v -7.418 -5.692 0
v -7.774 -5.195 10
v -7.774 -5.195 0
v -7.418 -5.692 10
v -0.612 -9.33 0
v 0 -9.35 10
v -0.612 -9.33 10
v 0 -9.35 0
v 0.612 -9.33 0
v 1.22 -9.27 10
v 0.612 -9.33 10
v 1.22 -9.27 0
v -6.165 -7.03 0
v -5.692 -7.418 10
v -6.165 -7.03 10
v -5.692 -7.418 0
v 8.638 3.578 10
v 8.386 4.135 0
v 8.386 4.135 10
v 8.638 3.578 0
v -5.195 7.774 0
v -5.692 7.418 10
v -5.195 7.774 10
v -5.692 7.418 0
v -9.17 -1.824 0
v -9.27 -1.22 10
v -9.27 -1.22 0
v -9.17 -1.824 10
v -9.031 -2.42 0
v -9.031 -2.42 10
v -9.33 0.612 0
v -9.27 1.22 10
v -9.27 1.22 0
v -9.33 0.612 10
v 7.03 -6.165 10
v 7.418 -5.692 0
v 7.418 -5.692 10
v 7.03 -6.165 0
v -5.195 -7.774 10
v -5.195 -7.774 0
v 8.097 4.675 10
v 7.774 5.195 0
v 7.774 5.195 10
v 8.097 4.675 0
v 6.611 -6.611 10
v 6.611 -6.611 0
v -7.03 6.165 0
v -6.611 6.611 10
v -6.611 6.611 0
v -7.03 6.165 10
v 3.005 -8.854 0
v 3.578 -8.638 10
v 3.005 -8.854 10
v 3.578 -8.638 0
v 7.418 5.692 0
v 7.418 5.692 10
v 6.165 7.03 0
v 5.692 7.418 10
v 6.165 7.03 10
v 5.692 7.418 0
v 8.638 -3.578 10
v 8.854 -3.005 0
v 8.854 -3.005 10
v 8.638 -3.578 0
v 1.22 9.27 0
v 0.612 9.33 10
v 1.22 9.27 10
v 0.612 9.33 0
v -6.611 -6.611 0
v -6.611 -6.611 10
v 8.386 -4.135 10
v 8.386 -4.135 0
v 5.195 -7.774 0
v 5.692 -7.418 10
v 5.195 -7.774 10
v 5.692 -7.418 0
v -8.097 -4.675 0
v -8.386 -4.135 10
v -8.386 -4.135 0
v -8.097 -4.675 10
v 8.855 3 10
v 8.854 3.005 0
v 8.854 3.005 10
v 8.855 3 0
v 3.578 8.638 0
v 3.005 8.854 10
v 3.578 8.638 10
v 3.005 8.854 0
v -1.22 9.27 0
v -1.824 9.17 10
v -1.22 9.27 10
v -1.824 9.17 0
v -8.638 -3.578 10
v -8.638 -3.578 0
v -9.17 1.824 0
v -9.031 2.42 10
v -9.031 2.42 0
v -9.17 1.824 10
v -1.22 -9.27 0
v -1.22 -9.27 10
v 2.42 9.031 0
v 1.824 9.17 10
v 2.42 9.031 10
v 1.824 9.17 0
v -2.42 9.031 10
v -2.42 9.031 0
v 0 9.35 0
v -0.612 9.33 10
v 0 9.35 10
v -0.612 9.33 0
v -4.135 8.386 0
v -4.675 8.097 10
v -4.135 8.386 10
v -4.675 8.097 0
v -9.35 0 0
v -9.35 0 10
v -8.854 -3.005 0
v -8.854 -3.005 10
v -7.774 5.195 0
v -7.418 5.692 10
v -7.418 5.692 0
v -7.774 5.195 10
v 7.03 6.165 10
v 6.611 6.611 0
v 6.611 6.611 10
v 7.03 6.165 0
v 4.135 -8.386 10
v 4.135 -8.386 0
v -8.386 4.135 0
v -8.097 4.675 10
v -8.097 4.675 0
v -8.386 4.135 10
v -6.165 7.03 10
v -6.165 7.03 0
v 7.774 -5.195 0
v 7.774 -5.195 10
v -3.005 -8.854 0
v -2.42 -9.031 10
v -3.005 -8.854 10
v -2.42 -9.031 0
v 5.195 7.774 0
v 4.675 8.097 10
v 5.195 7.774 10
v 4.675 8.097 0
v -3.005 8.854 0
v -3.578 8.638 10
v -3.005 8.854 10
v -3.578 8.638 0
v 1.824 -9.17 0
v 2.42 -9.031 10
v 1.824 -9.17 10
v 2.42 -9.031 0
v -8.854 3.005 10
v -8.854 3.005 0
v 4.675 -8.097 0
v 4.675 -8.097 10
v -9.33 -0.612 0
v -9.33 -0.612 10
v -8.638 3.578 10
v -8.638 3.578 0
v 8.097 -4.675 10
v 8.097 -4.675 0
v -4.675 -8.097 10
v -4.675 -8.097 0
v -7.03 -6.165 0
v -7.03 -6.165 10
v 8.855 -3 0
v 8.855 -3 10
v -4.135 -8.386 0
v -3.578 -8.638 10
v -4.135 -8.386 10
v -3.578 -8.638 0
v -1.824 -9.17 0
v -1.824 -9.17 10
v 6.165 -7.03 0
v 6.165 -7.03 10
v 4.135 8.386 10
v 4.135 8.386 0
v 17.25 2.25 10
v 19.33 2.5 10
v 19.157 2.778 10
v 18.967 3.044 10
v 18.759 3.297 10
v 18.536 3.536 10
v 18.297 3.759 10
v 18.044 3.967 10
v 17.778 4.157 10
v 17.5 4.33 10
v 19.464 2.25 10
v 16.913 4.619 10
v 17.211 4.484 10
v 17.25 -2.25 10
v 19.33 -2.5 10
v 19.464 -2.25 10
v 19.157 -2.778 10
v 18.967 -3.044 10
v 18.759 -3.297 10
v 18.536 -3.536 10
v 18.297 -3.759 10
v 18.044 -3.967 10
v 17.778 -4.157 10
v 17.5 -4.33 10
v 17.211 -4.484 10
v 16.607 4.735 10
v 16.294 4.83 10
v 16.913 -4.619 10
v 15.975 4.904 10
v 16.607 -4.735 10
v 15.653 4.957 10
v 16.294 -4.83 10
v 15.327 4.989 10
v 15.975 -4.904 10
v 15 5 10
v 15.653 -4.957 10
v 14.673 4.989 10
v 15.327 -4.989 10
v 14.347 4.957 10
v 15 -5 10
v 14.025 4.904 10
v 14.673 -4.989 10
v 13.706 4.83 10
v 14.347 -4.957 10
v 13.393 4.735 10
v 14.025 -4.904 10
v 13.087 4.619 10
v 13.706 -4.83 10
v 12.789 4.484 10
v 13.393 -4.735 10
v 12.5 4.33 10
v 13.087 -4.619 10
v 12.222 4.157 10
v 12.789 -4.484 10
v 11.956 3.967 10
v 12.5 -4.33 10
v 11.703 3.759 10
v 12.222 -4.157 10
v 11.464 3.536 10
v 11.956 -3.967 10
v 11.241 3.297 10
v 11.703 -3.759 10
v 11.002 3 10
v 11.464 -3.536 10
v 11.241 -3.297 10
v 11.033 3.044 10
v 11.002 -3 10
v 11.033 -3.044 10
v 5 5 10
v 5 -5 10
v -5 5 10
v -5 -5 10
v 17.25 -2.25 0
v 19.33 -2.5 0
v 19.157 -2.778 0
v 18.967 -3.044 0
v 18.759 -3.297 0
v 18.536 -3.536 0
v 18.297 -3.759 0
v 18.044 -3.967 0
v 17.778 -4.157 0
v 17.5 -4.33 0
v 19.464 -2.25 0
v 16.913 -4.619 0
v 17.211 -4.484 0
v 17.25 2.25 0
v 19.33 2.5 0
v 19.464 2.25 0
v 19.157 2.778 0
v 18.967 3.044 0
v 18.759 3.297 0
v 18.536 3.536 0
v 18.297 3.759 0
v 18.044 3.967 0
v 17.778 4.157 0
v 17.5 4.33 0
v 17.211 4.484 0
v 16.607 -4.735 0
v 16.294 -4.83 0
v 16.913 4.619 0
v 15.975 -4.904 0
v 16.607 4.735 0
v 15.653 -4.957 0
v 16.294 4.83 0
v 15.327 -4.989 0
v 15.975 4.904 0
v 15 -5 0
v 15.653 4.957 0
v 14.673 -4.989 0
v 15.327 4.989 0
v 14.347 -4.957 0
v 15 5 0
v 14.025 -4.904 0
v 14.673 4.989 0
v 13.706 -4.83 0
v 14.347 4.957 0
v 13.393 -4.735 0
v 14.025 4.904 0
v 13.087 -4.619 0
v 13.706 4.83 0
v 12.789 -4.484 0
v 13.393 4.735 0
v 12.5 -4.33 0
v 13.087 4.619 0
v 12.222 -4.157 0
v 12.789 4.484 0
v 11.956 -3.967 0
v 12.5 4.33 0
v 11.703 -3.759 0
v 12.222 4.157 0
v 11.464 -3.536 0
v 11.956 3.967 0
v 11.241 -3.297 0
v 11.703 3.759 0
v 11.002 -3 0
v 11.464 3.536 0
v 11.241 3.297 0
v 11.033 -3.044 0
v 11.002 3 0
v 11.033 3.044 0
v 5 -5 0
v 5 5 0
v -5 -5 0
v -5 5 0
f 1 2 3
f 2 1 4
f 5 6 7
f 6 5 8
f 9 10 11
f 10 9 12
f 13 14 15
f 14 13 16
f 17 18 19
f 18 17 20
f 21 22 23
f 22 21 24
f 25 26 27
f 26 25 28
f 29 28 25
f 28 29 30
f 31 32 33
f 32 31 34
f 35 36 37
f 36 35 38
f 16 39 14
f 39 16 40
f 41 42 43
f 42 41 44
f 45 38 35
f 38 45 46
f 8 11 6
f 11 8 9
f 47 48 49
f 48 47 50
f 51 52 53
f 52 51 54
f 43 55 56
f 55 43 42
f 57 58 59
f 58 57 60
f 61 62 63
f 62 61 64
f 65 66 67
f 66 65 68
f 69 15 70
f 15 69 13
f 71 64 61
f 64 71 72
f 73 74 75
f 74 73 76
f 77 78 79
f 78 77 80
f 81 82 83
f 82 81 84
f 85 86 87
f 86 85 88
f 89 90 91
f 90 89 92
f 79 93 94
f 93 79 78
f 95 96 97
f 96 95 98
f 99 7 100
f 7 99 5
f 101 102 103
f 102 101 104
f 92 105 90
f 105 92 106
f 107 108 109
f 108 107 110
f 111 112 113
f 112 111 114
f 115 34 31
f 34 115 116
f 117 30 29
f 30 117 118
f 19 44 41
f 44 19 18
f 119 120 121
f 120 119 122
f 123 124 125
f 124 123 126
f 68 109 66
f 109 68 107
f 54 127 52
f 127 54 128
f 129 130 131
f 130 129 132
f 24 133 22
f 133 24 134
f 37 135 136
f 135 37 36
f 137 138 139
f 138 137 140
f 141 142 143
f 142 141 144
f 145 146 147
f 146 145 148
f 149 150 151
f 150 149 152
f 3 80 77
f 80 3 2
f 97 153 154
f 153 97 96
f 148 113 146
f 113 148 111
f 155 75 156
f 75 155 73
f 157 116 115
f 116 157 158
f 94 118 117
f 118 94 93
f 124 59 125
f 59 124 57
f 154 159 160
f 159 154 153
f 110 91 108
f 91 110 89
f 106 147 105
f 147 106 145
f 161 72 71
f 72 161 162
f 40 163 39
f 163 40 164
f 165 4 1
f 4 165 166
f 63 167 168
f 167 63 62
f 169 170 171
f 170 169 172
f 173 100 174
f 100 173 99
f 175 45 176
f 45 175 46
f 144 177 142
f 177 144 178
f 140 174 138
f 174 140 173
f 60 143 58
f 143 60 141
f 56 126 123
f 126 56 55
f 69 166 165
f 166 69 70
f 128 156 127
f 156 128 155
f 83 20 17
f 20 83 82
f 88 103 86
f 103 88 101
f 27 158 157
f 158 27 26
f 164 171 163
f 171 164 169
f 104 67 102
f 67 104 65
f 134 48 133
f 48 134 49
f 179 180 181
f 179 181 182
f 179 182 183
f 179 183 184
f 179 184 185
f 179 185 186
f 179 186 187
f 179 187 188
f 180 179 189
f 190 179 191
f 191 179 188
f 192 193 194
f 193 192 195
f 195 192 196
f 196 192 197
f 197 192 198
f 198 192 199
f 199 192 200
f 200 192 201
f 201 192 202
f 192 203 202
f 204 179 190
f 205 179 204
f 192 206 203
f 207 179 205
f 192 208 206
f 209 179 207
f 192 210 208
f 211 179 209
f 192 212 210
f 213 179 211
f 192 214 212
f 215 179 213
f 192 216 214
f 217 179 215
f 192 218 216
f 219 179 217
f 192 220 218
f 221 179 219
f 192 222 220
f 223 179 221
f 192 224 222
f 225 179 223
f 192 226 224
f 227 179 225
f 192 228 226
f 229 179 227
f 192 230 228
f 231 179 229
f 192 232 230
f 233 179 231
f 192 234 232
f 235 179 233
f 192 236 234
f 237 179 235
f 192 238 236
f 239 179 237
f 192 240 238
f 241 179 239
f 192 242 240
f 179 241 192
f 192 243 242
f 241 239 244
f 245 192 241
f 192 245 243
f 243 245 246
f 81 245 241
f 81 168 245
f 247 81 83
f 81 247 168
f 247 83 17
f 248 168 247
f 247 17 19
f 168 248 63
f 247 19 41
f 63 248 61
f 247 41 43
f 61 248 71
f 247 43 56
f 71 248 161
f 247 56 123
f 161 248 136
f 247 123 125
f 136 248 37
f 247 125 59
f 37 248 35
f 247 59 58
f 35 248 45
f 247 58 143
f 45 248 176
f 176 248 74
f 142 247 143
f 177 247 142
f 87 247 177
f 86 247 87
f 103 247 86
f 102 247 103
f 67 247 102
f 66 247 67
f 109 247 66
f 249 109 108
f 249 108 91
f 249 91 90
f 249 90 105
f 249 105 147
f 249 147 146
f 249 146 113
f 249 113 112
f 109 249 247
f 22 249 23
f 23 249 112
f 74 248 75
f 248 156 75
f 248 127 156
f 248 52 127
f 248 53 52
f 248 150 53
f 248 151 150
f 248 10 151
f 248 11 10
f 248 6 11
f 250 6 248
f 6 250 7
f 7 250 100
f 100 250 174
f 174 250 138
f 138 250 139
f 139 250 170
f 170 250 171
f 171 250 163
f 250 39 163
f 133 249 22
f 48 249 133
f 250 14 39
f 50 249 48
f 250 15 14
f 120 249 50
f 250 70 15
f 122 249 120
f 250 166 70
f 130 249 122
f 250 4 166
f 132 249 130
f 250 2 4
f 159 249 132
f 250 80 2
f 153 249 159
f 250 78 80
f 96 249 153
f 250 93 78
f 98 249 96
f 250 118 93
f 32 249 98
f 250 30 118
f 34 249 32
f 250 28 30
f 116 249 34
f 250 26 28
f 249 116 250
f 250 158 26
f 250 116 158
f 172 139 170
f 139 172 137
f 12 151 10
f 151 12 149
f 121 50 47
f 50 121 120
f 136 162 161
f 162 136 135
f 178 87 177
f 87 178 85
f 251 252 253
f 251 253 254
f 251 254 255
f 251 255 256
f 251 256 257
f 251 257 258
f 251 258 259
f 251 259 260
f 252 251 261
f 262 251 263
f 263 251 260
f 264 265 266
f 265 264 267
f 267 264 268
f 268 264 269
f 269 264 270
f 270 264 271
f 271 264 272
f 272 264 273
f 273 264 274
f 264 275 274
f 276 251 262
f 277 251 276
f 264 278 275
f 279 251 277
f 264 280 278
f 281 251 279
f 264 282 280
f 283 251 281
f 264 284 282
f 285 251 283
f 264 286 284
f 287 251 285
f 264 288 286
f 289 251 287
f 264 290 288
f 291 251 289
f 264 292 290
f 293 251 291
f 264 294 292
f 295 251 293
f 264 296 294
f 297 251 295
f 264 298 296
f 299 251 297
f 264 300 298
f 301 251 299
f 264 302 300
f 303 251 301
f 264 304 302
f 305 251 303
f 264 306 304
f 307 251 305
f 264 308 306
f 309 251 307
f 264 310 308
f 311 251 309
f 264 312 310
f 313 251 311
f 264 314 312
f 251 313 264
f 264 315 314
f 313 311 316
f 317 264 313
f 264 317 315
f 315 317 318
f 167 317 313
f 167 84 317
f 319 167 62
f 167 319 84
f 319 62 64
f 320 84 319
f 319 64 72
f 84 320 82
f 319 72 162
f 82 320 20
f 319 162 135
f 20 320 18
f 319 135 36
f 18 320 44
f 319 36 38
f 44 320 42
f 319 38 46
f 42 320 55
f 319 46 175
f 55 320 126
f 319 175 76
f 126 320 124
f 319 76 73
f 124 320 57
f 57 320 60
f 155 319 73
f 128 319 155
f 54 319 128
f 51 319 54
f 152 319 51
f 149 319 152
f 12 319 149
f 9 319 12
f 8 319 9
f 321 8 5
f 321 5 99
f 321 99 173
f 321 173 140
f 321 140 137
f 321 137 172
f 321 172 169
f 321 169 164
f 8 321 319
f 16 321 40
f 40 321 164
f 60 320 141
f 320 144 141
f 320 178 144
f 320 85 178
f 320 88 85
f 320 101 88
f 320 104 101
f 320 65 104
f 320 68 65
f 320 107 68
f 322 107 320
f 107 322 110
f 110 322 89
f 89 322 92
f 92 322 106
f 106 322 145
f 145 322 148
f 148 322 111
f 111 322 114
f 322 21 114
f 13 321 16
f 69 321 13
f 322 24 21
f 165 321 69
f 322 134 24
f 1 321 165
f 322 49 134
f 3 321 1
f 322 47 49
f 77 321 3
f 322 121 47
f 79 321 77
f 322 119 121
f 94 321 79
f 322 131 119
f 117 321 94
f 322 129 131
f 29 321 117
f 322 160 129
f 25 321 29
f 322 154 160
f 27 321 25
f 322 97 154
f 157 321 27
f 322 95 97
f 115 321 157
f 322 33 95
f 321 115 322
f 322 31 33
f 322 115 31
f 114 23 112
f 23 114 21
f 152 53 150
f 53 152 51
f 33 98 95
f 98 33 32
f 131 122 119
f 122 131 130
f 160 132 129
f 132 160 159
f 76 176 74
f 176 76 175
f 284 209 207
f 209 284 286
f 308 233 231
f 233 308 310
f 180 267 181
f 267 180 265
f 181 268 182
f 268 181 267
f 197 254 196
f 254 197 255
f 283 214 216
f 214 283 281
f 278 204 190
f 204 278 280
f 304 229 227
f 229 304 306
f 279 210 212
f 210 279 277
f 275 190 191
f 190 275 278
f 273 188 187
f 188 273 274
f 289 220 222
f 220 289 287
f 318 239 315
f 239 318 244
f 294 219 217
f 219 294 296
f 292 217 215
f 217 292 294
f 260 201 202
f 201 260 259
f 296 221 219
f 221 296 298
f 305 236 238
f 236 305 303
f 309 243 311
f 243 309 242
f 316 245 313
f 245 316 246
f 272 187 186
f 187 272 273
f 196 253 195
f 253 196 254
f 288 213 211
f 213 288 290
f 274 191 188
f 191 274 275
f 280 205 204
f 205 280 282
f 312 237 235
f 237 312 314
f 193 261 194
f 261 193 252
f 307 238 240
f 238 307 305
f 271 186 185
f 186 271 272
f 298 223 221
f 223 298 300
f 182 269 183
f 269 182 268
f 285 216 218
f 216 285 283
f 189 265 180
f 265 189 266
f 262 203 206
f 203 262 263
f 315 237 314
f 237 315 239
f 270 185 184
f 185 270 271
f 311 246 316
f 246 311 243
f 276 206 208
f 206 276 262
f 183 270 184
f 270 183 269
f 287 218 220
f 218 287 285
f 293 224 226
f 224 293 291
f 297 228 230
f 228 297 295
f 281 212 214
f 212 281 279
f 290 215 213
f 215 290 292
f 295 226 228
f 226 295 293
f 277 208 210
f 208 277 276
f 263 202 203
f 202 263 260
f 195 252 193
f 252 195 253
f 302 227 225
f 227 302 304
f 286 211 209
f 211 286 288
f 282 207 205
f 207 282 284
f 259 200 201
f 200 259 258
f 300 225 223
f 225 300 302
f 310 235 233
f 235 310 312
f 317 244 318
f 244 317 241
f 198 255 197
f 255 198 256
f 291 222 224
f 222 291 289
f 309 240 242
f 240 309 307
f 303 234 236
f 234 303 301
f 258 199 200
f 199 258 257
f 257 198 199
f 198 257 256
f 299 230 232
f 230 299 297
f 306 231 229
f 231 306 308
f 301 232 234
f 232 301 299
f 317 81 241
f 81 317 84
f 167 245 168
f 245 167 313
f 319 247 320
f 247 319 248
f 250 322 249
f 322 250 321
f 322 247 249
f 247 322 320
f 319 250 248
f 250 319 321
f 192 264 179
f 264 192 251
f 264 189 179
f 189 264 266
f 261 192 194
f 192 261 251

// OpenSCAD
// Tubing clip for 12.7 mm (1/2 inch) lab stand rod
// Print orientation: flat, extruded along Z (z = 0 to 10)

// ---------------- Parameters ----------------
extrusion_height   = 10;    // Z height of the part (mm)
rod_d              = 12.7;  // stand rod inner diameter (mm)
rod_wall           = 3;     // stand rod ring wall thickness (mm)
rod_opening_w      = 10;    // width of the -X side opening (mm)

tubing_d           = 6;     // tubing inner diameter (mm)
tubing_wall        = 2;     // tubing ring wall thickness (mm)
tubing_opening_w   = 4.5;   // width of the +X side opening (mm)

bridge_w           = 6;     // bridge width in Y (mm)
bridge_x_start     = 8;     // bridge start in X (mm)
bridge_x_end       = 12;    // bridge end in X (mm)

eps                = 0.5;   // cutter overshoot past faces (mm)
$fn                = 96;    // curve resolution

// ---------------- Derived ----------------
rod_outer = rod_d + 2 * rod_wall;        // 18.7 mm
tubing_outer = tubing_d + 2 * tubing_wall; // 10 mm
tubing_opening_half = tubing_opening_w / 2; // 2.25 mm

// ---------------- Model ----------------
difference() {
    union() {
        // Rod ring
        cylinder(h = extrusion_height, d = rod_outer);
        // Tubing ring
        translate([15, 0, 0])
            cylinder(h = extrusion_height, d = tubing_outer);
        // Solid bridge
        translate([bridge_x_start, -bridge_w / 2, 0])
            cube([bridge_x_end - bridge_x_start, bridge_w, extrusion_height]);
    }
    // Opening in the rod ring (-X side)
    translate([-rod_opening_w / 2, -rod_opening_w / 2, -eps])
        cube([rod_opening_w, rod_opening_w, extrusion_height + 2 * eps]);
    // Opening in the tubing ring (+X side)
    translate([15 + tubing_opening_half, -tubing_opening_half, -eps])
        cube([tubing_opening_w, tubing_opening_w, extrusion_height + 2 * eps]);
}
